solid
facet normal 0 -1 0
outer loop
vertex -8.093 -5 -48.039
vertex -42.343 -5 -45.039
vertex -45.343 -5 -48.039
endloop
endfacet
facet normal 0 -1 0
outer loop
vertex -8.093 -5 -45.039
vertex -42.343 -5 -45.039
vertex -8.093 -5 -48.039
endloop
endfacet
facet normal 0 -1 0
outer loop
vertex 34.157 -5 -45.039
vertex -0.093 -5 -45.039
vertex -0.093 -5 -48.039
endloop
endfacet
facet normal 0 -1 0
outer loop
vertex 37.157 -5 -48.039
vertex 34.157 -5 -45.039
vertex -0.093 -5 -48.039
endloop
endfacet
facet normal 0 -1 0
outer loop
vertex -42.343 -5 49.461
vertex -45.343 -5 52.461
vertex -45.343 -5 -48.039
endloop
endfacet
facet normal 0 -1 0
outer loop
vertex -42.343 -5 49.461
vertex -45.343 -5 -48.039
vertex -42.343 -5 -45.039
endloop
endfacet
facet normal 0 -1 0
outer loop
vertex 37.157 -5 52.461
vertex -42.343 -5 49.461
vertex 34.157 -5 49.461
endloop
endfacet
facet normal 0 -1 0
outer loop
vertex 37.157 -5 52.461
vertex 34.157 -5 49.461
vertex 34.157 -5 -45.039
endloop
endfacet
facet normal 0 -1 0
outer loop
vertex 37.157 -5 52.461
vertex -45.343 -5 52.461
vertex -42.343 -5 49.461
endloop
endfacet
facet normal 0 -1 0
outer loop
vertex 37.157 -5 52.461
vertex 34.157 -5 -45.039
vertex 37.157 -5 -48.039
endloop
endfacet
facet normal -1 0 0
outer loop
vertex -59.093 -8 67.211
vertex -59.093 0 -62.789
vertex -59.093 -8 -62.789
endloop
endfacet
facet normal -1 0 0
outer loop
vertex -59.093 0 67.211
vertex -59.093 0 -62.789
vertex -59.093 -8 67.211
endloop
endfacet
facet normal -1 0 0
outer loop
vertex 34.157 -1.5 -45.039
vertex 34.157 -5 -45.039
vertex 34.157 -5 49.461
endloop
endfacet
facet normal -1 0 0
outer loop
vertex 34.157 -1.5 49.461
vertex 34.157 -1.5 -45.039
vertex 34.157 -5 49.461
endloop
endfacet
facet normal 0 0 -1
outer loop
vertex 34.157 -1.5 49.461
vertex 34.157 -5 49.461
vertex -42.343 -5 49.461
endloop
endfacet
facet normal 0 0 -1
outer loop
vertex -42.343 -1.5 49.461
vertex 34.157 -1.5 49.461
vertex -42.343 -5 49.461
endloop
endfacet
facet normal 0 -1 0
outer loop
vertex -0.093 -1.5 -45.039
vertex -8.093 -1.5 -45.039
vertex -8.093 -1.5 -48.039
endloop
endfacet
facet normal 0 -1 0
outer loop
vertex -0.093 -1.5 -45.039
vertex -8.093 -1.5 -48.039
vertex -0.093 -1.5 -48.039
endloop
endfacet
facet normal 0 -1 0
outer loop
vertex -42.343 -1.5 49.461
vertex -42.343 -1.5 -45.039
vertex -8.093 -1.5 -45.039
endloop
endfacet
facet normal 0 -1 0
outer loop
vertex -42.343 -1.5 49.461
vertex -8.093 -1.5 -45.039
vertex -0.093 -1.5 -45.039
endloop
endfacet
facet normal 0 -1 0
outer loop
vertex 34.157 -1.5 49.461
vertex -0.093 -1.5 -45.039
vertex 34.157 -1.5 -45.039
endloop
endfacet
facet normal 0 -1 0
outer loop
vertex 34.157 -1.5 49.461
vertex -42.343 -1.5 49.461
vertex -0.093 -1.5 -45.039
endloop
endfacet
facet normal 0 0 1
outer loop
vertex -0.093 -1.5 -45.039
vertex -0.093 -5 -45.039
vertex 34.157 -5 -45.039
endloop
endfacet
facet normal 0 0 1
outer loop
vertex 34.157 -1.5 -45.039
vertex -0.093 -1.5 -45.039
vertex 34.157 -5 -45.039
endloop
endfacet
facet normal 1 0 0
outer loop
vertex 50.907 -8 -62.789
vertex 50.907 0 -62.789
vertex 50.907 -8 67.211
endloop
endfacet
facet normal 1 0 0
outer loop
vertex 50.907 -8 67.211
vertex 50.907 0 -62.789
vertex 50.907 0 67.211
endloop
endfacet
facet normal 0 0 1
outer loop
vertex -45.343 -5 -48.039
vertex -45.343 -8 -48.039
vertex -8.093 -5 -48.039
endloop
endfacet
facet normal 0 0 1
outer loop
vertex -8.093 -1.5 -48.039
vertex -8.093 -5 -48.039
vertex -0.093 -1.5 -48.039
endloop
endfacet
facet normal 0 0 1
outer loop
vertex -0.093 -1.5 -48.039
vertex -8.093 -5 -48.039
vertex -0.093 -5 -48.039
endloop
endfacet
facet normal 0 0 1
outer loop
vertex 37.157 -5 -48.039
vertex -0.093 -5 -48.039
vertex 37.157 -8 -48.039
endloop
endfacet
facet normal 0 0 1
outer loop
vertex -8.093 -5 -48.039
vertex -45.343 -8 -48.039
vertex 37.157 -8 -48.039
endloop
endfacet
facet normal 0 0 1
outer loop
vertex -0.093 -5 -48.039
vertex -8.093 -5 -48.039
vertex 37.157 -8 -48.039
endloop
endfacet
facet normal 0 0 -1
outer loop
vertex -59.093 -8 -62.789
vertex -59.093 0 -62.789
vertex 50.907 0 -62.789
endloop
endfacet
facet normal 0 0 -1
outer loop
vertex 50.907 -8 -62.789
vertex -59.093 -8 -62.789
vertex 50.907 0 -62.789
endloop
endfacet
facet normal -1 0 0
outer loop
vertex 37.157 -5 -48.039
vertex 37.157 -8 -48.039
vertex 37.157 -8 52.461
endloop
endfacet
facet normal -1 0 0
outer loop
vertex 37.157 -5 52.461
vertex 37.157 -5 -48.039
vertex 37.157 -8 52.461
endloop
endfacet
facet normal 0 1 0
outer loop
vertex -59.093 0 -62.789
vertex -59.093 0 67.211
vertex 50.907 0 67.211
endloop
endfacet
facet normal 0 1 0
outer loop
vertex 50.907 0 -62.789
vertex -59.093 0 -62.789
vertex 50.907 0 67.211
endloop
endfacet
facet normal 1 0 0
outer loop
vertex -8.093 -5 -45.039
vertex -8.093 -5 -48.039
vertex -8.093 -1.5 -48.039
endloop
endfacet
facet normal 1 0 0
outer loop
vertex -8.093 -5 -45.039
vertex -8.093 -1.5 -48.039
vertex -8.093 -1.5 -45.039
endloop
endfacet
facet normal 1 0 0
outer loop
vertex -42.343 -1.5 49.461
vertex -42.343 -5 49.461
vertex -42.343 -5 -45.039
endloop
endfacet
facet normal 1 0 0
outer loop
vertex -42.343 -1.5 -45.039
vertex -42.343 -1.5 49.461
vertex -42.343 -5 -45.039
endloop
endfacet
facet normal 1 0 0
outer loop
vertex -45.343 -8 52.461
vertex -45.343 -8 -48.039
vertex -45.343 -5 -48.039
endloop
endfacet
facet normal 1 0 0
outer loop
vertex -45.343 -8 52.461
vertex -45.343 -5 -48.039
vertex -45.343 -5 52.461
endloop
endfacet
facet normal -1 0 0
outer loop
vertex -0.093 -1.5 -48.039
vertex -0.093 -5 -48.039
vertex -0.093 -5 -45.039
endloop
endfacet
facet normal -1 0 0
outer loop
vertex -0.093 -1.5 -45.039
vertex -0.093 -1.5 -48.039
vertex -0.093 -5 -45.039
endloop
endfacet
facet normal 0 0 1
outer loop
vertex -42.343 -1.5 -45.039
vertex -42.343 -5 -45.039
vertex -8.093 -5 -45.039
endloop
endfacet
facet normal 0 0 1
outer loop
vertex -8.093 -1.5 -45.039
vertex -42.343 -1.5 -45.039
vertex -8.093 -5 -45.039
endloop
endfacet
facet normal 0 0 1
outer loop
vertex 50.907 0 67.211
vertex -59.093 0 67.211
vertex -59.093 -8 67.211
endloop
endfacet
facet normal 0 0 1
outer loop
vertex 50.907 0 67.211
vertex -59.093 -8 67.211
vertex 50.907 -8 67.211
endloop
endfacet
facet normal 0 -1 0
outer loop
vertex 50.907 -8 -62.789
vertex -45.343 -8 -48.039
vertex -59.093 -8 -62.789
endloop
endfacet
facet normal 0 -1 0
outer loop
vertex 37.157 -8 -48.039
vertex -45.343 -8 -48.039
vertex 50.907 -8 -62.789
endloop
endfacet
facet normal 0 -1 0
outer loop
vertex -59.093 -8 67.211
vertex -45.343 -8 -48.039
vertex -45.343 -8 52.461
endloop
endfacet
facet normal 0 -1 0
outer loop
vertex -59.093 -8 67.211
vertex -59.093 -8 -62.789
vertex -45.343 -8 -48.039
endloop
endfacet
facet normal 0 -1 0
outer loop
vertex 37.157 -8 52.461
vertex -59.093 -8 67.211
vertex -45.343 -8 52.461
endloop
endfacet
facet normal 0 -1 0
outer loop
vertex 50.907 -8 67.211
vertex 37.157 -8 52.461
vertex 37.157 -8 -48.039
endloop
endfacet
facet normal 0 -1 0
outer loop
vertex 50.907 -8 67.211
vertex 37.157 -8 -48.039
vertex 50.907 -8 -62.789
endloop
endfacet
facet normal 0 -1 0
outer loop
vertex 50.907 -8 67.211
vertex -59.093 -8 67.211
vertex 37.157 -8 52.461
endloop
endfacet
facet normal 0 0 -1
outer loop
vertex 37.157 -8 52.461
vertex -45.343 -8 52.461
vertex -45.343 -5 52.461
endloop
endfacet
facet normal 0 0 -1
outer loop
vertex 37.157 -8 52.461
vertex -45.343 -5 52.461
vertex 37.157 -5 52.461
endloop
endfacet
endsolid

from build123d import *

# Parameters (mm, degrees)
F0_W     = 110
F0_H     = 130
F1_DEPTH = 8
F2_W     = 82.5
F2_H     = 100.5
F3_DEPTH = 3
F4_W     = 8
F4_H     = 3
F5_DEPTH = 3.5


with BuildPart() as f1:
    # F0 (on Front) → F1 (new body)
    with BuildSketch(Plane.XZ):
        with Locations((-4.093055, 2.210701)):
            Rectangle(F0_W, F0_H)
    extrude(amount=F1_DEPTH)

    # F2 (on face) → F3 (cut)
    with BuildSketch(Plane.XZ.offset(8)):
        with Locations((-4.093055, 2.210701)):
            Rectangle(F2_W, F2_H)
    extrude(amount=-F3_DEPTH, mode=Mode.SUBTRACT)

    # F4 (on face) → F5 (cut)
    with BuildSketch(Plane.XZ.offset(5)):
        Polygon((34.156945, 49.460701), (-42.343055, 49.460701), (-42.343055, -45.039299), (-8.093055, -45.039299), (-0.093055, -45.039299), (34.156945, -45.039299), align=None)
        with Locations((-4.093055, -46.539299)):
            Rectangle(F4_W, F4_H)
    extrude(amount=-F5_DEPTH, mode=Mode.SUBTRACT)


solid = f1.part
